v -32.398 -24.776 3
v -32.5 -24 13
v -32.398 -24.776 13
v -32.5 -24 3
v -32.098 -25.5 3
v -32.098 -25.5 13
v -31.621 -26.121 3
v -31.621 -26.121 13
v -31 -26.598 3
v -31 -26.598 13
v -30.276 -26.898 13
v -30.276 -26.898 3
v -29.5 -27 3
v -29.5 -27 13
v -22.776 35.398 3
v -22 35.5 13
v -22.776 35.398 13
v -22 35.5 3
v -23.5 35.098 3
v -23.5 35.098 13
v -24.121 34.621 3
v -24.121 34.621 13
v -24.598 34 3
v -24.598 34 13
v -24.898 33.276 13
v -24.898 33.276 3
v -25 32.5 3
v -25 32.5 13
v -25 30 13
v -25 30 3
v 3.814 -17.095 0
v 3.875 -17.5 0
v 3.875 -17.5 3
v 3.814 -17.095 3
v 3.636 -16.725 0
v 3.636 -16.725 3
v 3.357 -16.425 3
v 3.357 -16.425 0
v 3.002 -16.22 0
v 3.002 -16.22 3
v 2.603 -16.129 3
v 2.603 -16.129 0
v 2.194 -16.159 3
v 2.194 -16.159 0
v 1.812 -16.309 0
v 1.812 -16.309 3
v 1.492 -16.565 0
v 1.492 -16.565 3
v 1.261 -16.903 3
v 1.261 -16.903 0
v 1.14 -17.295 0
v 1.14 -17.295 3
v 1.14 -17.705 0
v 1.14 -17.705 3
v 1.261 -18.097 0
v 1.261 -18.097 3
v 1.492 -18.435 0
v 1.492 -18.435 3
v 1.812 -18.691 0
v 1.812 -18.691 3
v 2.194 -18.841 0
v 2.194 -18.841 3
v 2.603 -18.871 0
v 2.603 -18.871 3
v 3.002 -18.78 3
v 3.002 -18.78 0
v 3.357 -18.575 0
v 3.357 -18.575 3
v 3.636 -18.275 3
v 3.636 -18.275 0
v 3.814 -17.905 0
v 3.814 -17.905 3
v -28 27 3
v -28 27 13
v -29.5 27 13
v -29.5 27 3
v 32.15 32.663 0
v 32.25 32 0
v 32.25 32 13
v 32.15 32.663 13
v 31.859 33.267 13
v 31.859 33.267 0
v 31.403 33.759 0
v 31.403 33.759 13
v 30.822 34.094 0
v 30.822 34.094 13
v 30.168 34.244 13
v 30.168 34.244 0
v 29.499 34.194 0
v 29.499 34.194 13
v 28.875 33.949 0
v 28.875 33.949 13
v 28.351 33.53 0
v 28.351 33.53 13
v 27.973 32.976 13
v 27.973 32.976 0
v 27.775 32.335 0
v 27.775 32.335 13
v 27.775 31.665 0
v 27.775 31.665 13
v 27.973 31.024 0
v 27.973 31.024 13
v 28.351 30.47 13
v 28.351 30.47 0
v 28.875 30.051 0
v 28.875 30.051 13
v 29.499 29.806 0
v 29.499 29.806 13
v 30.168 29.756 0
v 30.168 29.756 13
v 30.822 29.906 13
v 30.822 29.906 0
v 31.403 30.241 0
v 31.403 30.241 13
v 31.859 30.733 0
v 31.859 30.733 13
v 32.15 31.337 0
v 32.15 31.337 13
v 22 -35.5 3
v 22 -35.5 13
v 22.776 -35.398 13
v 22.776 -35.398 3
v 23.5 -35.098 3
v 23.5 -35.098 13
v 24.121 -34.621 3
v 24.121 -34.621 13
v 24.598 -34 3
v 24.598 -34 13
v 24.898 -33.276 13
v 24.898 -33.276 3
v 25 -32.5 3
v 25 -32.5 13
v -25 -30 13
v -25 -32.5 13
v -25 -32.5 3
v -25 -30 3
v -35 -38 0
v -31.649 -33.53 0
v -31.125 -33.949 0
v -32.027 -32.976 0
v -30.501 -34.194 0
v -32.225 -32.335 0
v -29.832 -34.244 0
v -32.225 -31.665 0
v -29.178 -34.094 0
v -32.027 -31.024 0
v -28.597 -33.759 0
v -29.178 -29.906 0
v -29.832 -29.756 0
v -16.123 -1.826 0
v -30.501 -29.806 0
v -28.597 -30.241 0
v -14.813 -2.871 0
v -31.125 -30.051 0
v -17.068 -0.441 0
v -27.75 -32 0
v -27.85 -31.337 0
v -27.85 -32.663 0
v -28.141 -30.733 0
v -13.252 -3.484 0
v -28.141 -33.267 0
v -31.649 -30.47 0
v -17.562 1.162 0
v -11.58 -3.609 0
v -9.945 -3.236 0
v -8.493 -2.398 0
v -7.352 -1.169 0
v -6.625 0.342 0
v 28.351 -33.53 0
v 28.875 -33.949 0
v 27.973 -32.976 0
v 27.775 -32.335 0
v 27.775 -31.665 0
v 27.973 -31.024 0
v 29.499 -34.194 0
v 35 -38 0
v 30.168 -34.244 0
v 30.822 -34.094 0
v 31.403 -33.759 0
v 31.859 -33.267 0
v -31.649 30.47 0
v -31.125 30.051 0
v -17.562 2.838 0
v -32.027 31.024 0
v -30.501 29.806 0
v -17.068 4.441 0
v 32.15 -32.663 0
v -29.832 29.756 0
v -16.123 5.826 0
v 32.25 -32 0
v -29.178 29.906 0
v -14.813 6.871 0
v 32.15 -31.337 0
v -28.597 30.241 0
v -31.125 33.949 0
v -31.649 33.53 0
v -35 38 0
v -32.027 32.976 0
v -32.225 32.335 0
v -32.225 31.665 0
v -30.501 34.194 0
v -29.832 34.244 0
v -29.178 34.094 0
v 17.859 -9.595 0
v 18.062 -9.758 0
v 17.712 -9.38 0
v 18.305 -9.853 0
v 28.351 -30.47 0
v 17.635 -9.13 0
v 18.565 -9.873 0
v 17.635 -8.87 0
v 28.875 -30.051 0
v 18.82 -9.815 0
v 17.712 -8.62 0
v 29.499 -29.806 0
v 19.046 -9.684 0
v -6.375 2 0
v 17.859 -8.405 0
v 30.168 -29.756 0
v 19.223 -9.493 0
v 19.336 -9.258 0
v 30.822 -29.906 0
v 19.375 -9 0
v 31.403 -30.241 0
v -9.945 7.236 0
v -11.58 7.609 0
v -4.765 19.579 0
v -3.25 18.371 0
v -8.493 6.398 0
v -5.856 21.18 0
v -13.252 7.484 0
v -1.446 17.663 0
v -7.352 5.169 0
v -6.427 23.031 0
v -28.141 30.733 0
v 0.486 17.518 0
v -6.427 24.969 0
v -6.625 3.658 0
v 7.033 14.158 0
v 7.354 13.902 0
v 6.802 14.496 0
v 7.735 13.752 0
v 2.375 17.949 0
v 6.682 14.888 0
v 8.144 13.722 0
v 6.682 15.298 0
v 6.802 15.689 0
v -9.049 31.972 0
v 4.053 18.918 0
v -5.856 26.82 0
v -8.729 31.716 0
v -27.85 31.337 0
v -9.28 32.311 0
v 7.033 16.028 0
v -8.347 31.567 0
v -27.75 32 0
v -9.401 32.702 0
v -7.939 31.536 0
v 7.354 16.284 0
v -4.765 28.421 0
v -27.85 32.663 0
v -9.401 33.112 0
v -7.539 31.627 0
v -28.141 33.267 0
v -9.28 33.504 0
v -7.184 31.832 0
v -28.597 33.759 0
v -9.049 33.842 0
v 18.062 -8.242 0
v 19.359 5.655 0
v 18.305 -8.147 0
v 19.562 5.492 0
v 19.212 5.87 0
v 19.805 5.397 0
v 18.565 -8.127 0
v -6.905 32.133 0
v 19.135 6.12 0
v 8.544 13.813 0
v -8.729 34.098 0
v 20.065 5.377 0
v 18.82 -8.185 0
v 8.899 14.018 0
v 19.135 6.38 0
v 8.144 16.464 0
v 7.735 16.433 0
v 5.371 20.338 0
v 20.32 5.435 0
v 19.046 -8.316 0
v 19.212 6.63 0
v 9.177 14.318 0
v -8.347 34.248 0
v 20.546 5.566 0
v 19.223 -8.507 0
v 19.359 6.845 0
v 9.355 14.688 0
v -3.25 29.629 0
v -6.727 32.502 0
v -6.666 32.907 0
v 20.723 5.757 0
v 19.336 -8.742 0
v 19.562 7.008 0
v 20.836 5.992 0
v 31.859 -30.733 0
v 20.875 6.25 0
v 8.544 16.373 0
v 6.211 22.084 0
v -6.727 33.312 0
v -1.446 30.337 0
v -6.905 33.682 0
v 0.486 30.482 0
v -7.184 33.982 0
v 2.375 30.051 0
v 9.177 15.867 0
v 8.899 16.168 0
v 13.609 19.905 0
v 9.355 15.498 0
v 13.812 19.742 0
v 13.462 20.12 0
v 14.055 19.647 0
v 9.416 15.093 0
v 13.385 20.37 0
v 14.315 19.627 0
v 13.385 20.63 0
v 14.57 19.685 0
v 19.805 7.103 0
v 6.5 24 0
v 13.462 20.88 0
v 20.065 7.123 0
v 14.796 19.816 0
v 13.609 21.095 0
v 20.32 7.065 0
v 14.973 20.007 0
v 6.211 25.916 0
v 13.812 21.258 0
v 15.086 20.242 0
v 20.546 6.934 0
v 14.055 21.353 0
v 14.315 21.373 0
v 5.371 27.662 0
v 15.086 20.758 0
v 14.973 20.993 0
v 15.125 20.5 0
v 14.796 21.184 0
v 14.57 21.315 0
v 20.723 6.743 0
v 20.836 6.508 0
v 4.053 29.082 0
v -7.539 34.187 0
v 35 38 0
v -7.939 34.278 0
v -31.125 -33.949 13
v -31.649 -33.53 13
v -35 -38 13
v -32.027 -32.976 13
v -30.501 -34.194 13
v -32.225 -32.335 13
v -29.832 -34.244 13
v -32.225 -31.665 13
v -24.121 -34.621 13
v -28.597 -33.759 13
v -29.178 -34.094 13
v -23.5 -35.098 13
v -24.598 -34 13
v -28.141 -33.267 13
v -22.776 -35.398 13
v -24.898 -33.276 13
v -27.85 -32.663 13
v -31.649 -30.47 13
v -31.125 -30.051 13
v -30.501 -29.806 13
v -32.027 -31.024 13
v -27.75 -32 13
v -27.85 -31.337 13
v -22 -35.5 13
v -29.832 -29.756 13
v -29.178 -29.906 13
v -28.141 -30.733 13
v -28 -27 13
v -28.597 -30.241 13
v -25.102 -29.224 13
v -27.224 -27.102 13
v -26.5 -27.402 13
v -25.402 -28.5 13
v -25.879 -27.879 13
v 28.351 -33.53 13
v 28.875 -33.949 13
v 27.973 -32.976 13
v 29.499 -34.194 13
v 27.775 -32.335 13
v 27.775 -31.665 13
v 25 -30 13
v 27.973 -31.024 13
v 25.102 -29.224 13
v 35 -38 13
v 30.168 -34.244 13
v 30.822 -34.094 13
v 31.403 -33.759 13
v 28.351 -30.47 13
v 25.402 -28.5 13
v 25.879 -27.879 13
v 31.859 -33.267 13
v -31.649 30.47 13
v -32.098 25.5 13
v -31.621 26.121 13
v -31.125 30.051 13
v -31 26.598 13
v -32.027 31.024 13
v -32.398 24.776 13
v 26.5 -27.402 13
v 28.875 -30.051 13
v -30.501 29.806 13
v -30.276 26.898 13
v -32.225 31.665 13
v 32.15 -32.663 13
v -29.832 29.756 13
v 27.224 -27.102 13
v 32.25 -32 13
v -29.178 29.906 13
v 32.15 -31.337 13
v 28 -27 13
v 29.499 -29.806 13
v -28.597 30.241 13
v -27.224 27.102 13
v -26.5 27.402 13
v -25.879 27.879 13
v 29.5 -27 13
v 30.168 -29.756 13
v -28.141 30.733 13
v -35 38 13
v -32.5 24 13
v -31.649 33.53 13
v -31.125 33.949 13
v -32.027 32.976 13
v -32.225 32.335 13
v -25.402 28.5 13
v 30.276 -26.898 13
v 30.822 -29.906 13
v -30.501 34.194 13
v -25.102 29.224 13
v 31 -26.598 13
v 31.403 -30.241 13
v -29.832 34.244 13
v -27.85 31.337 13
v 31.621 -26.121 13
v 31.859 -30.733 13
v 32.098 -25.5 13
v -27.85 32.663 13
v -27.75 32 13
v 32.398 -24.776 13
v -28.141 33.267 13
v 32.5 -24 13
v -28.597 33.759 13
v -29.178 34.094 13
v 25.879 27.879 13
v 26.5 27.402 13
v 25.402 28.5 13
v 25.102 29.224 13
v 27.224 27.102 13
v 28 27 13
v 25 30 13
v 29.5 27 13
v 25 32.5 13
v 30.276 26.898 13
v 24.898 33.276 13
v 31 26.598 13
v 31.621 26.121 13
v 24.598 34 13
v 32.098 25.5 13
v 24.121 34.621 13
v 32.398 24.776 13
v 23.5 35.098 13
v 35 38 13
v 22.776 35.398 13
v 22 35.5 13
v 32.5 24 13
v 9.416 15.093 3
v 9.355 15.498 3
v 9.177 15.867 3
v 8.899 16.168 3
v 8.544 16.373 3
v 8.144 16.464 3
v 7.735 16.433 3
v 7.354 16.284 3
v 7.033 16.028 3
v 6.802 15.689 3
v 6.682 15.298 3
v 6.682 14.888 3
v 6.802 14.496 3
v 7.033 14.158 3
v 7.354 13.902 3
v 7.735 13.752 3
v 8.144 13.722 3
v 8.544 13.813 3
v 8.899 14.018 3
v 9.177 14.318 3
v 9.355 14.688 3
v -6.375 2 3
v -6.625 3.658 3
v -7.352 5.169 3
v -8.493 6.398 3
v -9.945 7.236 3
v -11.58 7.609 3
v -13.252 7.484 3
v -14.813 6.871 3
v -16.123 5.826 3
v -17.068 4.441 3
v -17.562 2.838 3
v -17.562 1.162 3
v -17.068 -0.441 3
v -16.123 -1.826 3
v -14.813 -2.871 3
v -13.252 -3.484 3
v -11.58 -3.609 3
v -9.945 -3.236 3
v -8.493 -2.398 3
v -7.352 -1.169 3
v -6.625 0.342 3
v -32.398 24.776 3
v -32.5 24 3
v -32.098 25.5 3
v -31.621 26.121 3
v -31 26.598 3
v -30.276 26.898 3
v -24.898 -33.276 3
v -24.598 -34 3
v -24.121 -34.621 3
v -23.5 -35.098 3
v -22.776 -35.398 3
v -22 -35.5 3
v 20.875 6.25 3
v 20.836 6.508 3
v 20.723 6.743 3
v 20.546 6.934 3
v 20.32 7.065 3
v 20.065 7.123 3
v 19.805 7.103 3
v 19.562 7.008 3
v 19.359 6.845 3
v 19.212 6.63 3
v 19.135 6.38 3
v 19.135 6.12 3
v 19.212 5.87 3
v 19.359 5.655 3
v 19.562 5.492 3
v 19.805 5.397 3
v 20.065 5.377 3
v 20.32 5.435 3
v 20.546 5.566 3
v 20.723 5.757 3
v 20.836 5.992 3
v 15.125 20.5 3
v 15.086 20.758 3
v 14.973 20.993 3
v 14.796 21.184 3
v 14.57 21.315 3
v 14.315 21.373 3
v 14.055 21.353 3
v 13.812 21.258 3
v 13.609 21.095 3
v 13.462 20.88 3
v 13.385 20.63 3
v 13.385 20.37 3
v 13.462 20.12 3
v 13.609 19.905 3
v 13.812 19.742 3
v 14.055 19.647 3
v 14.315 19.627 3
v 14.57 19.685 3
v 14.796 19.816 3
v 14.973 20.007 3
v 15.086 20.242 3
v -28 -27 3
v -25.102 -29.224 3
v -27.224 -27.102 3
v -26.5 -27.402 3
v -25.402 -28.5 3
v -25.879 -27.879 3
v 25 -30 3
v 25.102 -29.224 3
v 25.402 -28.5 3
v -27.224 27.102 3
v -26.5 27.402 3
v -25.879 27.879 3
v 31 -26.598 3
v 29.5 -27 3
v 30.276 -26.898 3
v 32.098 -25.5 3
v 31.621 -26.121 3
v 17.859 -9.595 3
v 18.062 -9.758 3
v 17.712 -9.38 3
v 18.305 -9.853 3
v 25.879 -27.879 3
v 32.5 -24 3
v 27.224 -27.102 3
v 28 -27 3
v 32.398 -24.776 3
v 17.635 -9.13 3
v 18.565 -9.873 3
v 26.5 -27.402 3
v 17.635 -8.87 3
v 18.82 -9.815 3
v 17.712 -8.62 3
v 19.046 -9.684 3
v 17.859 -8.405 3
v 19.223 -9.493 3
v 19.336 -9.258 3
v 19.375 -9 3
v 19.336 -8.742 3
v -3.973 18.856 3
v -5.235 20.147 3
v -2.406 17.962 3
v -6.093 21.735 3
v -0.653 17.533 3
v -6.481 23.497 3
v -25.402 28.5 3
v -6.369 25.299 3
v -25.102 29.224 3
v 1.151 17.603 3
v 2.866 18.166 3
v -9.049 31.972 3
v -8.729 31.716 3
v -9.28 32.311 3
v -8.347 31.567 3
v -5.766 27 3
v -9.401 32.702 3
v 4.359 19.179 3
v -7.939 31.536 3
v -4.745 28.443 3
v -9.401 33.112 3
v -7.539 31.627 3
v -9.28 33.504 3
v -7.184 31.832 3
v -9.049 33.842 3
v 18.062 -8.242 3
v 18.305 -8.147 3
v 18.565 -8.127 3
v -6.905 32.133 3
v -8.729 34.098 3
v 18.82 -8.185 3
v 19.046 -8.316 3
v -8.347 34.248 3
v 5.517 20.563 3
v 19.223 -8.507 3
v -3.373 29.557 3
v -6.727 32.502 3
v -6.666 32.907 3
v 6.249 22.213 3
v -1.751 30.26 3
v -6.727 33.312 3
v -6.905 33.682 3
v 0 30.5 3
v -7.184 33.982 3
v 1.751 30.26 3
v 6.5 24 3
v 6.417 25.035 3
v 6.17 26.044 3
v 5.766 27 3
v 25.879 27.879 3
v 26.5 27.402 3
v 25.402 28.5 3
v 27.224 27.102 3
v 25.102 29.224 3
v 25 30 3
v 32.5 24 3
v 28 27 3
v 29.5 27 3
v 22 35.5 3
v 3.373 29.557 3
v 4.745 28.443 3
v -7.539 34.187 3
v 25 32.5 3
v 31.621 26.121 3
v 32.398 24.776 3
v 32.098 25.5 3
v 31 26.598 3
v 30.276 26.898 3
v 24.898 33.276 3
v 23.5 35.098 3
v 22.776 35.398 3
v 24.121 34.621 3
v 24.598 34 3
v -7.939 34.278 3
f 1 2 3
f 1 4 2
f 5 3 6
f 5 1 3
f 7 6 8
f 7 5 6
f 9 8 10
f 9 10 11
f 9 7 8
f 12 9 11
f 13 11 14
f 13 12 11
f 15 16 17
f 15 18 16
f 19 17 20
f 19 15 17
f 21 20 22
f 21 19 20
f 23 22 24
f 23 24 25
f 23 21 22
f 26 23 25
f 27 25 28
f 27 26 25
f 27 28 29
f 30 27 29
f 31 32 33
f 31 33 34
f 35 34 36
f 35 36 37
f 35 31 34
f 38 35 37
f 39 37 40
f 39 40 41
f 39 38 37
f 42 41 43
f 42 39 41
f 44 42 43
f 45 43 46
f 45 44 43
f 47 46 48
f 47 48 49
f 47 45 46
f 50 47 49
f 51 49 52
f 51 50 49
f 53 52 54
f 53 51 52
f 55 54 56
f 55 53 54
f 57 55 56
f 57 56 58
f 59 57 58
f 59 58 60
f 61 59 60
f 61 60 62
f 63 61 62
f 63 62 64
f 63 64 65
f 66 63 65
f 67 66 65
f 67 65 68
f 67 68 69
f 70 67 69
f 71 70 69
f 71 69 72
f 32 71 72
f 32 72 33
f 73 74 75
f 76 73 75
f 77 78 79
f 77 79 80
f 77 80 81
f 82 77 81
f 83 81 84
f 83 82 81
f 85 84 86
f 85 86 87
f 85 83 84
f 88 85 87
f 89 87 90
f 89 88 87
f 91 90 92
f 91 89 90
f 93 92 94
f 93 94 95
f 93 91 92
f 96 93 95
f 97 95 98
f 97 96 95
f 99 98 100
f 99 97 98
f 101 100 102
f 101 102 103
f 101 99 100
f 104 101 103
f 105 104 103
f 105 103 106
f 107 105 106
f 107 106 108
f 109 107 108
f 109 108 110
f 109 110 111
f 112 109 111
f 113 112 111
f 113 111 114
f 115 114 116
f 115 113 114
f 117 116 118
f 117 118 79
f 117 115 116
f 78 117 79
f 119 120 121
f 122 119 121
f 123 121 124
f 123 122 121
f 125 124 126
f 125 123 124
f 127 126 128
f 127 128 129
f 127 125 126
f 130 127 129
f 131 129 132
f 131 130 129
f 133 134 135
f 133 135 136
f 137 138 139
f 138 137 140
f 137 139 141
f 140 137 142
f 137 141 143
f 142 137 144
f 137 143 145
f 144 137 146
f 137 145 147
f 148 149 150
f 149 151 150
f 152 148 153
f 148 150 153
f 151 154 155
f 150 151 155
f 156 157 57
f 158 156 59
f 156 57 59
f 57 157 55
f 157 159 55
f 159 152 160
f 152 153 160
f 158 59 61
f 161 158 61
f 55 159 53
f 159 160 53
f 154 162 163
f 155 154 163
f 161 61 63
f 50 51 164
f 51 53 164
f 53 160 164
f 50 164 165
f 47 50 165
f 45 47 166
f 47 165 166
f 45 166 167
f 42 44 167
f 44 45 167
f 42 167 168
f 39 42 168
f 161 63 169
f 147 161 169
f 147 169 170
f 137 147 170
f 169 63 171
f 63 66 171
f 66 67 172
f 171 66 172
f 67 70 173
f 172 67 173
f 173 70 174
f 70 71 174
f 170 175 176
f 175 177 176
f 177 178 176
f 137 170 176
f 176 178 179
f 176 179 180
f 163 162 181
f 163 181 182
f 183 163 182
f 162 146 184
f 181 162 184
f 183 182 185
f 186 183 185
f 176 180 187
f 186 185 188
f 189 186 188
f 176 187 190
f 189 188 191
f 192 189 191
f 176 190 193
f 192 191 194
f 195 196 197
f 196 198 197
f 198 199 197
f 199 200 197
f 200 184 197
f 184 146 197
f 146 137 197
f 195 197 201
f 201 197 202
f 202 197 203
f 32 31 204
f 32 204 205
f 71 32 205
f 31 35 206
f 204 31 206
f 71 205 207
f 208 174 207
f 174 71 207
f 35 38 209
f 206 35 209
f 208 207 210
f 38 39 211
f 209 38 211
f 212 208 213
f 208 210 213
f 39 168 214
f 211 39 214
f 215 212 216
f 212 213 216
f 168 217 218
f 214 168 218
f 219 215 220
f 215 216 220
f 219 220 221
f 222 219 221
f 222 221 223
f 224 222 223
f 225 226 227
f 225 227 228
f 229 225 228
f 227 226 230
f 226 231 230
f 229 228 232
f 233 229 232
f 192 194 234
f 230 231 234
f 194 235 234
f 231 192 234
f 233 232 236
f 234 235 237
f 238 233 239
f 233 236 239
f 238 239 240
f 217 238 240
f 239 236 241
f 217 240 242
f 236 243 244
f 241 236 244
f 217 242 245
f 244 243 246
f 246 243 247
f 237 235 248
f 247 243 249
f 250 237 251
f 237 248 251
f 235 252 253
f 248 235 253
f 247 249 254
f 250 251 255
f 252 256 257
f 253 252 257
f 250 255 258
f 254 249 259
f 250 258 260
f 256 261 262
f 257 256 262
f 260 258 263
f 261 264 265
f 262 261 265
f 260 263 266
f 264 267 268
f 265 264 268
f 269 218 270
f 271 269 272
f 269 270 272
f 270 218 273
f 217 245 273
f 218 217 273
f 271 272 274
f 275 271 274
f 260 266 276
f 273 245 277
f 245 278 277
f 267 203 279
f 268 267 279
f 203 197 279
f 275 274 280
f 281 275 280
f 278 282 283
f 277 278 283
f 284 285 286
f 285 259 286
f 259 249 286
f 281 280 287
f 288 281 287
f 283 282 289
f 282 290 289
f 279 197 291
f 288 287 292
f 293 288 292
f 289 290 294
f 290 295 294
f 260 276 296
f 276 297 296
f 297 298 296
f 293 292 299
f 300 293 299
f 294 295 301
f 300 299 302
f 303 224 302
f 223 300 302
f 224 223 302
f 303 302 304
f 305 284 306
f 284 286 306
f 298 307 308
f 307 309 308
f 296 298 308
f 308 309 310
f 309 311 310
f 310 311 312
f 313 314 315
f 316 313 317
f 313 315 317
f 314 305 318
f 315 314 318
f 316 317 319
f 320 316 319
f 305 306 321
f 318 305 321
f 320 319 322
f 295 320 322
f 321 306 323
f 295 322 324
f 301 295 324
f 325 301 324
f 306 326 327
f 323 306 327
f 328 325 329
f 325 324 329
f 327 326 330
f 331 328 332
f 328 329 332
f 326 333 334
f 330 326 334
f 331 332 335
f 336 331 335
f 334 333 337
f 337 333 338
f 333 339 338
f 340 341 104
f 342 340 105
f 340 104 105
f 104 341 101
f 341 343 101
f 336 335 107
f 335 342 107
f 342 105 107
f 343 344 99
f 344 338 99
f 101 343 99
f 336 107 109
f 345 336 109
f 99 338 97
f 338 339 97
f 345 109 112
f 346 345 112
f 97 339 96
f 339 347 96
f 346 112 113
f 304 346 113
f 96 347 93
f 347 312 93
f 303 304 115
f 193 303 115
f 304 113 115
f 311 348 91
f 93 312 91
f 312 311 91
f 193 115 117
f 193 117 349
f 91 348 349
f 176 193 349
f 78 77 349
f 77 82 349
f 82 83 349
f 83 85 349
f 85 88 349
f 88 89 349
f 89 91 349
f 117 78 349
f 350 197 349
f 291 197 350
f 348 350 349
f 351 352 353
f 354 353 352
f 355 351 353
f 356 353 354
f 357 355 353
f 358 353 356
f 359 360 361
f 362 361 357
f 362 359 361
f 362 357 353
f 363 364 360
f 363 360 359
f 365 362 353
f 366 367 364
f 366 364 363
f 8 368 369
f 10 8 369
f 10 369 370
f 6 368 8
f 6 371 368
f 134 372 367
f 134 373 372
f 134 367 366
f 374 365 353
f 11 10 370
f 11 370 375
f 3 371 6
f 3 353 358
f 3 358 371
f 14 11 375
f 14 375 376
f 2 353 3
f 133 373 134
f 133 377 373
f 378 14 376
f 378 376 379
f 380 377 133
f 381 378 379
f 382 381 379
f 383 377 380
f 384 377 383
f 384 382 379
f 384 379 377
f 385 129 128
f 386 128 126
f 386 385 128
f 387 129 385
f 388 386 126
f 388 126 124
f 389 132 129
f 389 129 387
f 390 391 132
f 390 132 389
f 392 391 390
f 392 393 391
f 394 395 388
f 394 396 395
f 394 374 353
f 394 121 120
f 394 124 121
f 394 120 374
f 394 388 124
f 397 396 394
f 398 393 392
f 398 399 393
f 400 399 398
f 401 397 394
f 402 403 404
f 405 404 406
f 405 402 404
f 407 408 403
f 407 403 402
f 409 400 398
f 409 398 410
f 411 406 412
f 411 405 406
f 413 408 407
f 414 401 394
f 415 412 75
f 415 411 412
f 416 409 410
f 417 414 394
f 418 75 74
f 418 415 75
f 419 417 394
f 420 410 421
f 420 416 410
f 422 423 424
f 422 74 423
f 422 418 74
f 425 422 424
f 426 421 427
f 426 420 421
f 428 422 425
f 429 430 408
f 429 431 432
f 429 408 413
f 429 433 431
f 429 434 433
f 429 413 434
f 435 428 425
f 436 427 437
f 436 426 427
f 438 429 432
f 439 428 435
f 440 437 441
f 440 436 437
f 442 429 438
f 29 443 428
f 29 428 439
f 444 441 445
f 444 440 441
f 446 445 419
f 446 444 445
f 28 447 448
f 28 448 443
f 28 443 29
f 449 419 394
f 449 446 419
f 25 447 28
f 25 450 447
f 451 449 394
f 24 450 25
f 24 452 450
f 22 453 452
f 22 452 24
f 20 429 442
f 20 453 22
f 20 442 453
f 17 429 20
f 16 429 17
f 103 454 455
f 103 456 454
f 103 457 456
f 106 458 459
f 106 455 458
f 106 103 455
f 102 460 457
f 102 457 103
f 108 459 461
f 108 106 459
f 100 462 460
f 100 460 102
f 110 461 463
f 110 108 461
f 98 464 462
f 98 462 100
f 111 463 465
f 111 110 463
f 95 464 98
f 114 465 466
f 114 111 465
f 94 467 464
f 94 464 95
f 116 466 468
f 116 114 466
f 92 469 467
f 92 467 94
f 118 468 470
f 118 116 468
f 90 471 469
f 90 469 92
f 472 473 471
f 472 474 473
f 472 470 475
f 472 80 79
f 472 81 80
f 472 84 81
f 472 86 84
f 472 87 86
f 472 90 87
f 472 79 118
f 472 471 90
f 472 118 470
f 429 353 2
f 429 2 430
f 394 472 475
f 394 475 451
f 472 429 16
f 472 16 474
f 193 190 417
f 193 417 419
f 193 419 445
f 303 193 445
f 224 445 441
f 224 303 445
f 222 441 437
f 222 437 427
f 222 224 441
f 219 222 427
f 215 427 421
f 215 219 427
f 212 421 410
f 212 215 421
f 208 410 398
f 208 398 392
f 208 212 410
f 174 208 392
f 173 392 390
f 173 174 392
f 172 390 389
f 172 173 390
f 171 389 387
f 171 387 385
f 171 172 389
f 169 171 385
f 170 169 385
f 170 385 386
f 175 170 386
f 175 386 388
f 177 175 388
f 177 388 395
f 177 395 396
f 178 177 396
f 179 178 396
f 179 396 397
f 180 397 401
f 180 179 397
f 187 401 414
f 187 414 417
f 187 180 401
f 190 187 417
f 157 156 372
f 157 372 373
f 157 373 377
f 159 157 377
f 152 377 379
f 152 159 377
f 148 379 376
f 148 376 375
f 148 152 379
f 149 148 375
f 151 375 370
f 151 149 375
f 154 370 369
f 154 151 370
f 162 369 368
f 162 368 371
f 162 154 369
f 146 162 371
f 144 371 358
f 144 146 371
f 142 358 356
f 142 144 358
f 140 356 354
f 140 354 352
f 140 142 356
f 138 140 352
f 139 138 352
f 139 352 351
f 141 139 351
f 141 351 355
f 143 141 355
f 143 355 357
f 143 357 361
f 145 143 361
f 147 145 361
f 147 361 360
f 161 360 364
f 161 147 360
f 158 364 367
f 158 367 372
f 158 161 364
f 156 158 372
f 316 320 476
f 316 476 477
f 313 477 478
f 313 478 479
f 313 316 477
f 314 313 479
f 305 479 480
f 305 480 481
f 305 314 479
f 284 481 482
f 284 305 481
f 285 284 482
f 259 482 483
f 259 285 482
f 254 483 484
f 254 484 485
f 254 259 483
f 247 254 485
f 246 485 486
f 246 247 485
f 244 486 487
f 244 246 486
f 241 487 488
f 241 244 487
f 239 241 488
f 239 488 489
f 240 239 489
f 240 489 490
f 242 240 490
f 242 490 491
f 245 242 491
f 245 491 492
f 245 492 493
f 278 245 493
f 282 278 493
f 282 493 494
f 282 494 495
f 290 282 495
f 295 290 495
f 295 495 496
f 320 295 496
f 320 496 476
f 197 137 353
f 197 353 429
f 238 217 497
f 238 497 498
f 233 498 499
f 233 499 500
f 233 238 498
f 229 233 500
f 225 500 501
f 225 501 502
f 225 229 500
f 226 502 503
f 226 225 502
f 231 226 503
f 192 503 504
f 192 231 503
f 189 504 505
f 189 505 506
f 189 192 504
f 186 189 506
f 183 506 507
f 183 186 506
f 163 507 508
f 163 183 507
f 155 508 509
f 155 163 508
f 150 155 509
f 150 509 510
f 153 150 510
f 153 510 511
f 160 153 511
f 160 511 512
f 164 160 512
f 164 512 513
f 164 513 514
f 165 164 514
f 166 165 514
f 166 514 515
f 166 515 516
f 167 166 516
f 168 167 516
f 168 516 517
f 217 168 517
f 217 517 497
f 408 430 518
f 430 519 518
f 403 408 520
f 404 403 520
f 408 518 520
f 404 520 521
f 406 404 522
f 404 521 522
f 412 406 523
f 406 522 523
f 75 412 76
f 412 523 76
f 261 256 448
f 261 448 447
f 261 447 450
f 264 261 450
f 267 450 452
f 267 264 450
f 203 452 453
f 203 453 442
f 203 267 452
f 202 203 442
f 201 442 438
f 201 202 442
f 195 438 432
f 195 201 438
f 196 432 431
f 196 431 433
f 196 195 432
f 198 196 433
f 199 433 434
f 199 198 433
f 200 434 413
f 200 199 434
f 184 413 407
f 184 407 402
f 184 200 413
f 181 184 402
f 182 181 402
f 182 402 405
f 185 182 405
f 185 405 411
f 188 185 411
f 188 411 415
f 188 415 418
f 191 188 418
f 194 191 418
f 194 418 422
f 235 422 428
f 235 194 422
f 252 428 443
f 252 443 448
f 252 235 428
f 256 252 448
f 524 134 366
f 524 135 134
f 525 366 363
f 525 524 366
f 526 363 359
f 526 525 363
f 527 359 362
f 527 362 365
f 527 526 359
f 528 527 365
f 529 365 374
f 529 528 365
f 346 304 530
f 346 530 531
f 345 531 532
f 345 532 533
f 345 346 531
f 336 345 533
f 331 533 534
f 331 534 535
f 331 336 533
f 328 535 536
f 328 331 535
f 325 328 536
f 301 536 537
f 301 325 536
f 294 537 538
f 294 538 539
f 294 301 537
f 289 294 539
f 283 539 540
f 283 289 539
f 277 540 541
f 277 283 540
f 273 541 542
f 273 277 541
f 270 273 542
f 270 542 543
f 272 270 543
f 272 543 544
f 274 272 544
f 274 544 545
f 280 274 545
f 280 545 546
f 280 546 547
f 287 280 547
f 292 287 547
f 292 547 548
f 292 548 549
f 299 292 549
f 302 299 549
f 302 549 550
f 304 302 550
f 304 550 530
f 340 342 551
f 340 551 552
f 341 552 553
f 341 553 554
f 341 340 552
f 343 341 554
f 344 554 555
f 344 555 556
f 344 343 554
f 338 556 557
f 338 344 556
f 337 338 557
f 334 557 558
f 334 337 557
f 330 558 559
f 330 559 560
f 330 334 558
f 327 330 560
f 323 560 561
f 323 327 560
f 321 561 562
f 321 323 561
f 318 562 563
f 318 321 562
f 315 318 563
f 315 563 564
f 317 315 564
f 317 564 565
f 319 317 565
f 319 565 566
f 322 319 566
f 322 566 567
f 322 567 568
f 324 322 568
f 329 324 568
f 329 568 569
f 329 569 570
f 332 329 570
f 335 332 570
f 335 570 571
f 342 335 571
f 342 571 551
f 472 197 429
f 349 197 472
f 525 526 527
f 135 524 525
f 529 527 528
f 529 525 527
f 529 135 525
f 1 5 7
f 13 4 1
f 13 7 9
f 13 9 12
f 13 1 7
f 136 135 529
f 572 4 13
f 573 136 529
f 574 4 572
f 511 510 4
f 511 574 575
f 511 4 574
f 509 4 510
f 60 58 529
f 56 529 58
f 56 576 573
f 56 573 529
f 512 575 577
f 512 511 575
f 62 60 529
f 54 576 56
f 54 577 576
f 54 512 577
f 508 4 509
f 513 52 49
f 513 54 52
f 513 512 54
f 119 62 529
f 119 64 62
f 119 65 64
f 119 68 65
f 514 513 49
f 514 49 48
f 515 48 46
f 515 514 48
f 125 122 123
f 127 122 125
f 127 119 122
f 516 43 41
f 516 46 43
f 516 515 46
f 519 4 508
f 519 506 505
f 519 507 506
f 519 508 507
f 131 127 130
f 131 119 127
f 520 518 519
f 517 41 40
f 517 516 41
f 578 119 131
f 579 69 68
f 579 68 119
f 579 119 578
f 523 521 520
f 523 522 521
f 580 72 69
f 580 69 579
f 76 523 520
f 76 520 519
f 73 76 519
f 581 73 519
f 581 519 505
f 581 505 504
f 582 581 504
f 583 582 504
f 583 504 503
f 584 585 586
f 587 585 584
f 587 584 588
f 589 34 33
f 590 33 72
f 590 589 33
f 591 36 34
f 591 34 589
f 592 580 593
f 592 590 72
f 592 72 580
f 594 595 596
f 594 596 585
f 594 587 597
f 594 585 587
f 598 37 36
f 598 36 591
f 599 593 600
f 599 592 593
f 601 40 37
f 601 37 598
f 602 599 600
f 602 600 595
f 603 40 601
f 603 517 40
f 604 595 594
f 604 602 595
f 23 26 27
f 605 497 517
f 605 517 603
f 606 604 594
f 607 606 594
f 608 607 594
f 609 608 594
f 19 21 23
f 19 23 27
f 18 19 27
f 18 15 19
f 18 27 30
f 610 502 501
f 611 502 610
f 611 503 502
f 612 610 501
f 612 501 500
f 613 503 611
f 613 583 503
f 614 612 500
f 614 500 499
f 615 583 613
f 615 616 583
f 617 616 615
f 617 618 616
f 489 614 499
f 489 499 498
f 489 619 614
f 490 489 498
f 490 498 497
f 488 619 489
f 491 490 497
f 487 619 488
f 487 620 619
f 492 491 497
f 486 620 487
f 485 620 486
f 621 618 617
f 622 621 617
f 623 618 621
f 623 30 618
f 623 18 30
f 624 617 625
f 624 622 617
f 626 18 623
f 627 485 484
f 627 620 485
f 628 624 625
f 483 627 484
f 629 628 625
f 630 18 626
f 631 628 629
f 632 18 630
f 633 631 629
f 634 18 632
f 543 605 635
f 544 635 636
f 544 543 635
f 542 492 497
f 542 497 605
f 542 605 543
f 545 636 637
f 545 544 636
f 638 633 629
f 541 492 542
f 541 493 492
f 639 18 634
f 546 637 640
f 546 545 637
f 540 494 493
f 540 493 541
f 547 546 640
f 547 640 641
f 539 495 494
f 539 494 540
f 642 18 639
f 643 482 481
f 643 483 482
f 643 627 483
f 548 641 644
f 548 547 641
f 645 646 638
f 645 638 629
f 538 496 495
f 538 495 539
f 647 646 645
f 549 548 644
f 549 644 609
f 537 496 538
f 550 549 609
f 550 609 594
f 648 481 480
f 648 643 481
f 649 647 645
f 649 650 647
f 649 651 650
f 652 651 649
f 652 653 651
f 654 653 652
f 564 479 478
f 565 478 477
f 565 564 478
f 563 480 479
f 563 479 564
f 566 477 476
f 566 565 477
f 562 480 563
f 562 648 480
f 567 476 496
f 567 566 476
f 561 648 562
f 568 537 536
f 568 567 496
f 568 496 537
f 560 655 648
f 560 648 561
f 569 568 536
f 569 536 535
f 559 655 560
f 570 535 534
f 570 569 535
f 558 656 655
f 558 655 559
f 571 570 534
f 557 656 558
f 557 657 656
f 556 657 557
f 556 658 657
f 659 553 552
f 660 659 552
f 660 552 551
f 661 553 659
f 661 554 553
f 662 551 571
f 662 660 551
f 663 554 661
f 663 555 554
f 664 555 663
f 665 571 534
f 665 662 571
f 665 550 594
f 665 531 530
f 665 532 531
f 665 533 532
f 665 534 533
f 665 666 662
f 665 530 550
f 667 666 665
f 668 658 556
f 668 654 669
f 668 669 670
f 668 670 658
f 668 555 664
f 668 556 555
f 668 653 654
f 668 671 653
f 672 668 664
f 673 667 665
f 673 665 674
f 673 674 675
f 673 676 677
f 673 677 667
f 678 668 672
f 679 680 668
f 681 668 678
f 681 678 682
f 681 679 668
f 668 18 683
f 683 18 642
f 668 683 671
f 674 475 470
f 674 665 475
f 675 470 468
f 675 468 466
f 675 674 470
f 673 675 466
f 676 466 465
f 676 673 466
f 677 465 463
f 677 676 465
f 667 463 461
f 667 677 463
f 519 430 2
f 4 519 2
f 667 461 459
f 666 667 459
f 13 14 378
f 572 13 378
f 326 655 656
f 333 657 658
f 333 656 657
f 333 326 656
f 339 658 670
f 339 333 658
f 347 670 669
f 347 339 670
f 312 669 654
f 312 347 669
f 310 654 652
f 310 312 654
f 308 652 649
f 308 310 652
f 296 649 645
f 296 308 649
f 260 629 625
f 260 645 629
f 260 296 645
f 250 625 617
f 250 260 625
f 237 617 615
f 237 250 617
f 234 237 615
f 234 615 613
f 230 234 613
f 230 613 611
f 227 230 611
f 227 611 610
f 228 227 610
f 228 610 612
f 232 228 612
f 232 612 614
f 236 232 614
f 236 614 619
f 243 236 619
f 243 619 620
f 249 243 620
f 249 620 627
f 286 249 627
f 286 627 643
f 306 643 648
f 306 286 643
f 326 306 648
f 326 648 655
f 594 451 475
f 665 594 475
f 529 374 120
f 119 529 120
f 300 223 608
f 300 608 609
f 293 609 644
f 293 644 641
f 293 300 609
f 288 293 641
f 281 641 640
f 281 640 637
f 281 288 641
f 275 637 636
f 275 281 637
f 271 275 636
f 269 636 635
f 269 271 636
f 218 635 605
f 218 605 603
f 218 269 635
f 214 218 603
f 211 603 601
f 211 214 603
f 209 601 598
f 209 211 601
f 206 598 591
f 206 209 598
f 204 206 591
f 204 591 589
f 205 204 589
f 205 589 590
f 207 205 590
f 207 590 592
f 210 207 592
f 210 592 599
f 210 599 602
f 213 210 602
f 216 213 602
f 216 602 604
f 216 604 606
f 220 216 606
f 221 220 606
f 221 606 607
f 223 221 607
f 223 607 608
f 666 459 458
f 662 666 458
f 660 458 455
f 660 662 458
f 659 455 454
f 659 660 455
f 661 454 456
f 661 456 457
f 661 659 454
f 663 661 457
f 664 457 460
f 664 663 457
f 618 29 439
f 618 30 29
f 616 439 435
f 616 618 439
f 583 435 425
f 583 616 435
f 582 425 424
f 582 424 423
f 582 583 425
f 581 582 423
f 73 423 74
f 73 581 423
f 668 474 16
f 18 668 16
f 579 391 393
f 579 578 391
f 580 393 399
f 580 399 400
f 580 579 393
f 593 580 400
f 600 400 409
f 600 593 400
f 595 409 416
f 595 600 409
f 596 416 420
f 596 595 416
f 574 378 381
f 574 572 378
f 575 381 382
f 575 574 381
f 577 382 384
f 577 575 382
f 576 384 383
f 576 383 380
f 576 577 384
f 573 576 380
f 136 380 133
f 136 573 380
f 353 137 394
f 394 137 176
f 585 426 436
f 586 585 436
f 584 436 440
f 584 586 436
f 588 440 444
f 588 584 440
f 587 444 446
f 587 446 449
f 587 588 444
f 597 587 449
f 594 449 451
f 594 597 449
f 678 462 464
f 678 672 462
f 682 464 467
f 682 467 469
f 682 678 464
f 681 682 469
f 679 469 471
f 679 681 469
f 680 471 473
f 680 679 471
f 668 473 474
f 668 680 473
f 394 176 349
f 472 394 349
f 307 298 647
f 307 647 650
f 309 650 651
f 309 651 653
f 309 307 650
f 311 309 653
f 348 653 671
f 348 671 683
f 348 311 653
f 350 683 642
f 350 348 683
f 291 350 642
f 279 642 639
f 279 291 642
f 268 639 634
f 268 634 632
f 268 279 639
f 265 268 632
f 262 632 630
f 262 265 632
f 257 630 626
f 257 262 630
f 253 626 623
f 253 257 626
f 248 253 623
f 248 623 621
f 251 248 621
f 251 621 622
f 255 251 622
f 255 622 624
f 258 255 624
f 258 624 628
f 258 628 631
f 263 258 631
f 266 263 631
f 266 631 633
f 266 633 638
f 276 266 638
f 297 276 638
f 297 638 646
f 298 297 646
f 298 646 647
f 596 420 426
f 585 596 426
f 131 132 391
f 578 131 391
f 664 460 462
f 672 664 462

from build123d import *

# Parameters (mm, degrees)
F0_W     = 70
F0_H     = 76
F0_R     = 2.25
F0_R_2   = 1.375
F0_R_3   = 0.875
F0_R_4   = 5.625
F0_R_5   = 6.5
F1_DEPTH = 13
F2_R     = 1.375
F2_R_2   = 0.875
F2_R_3   = 5.625
F2_W     = 50
F2_H     = 8.5
F3_DEPTH = 10
F4_R     = 3


with BuildPart() as f1:
    # F0 (on Top) → F1 (new body)
    with BuildSketch(Plane.XY):
        Rectangle(F0_W, F0_H)
        with Locations((-30, -32)):
            Circle(F0_R, mode=Mode.SUBTRACT)
        with Locations((30, -32)):
            Circle(F0_R, mode=Mode.SUBTRACT)
        with Locations((2.5, -17.5)):
            Circle(F0_R_2, mode=Mode.SUBTRACT)
        with Locations((18.5, -9)):
            Circle(F0_R_3, mode=Mode.SUBTRACT)
        with Locations((-12, 2)):
            Circle(F0_R_4, mode=Mode.SUBTRACT)
        with Locations((-30, 32)):
            Circle(F0_R, mode=Mode.SUBTRACT)
        with Locations((-8.0413195181, 32.907142101)):
            Circle(F0_R_2, mode=Mode.SUBTRACT)
        with Locations((8.0413195181, 15.092857899)):
            Circle(F0_R_2, mode=Mode.SUBTRACT)
        with Locations((20, 6.25)):
            Circle(F0_R_3, mode=Mode.SUBTRACT)
        with Locations((0, 24)):
            Circle(F0_R_5, mode=Mode.SUBTRACT)
        with Locations((14.25, 20.5)):
            Circle(F0_R_3, mode=Mode.SUBTRACT)
        with Locations((30, 32)):
            Circle(F0_R, mode=Mode.SUBTRACT)
    extrude(amount=F1_DEPTH)

    # F2 (on face) → F3 (cut)
    with BuildSketch(Plane.XY.offset(13)):
        with BuildLine():
            Line((-25, 27), (-32.5, 27))
            Line((-32.5, 27), (-32.5, -27))
            Line((-32.5, -27), (-25, -27))
            Line((-25, -27), (25, -27))
            Line((25, -27), (32.5, -27))
            Line((32.5, -27), (32.5, 27))
            Line((32.5, 27), (25, 27))
            Line((25, 27), (5.7662812973, 27))
            ThreePointArc((5.7662812973, 27), (6.3139064149, 25.5442104078), (6.5, 24))
            ThreePointArc((6.5, 24), (-1.5442104078, 17.6860935851), (-5.7662812973, 27))
            Line((-5.7662812973, 27), (-25, 27))
        make_face()
        with Locations((2.5, -17.5)):
            Circle(F2_R, mode=Mode.SUBTRACT)
        with Locations((18.5, -9)):
            Circle(F2_R_2, mode=Mode.SUBTRACT)
        with Locations((-12, 2)):
            Circle(F2_R_3, mode=Mode.SUBTRACT)
        with Locations((8.0413195181, 15.092857899)):
            Circle(F2_R, mode=Mode.SUBTRACT)
        with Locations((20, 6.25)):
            Circle(F2_R_2, mode=Mode.SUBTRACT)
        with Locations((14.25, 20.5)):
            Circle(F2_R_2, mode=Mode.SUBTRACT)
        with BuildLine():
            Line((-25, 35.5), (-25, 27))
            Line((-25, 27), (-5.7662812973, 27))
            ThreePointArc((-5.7662812973, 27), (0, 30.5), (5.7662812973, 27))
            Line((5.7662812973, 27), (25, 27))
            Line((25, 27), (25, 35.5))
            Line((25, 35.5), (-25, 35.5))
        make_face()
        with Locations((-8.0413195181, 32.907142101)):
            Circle(F2_R, mode=Mode.SUBTRACT)
        with Locations((0, -31.25)):
            Rectangle(F2_W, F2_H)
    extrude(amount=-F3_DEPTH, mode=Mode.SUBTRACT)

    # F4
    f4_edges = [f1.edges().sort_by_distance(p)[0] for p in [
        (-25, 27, 8),
        (25, 27, 8),
        (-25, -27, 8),
        (25, -27, 8),
        (32.5, -27, 8),
        (32.5, 27, 8),
        (25, 35.5, 8),
        (-25, 35.5, 8),
        (-32.5, 27, 8),
        (-32.5, -27, 8),
        (-25, -35.5, 8),
        (25, -35.5, 8),
    ]]
    fillet(f4_edges, radius=F4_R)


solid = f1.part
